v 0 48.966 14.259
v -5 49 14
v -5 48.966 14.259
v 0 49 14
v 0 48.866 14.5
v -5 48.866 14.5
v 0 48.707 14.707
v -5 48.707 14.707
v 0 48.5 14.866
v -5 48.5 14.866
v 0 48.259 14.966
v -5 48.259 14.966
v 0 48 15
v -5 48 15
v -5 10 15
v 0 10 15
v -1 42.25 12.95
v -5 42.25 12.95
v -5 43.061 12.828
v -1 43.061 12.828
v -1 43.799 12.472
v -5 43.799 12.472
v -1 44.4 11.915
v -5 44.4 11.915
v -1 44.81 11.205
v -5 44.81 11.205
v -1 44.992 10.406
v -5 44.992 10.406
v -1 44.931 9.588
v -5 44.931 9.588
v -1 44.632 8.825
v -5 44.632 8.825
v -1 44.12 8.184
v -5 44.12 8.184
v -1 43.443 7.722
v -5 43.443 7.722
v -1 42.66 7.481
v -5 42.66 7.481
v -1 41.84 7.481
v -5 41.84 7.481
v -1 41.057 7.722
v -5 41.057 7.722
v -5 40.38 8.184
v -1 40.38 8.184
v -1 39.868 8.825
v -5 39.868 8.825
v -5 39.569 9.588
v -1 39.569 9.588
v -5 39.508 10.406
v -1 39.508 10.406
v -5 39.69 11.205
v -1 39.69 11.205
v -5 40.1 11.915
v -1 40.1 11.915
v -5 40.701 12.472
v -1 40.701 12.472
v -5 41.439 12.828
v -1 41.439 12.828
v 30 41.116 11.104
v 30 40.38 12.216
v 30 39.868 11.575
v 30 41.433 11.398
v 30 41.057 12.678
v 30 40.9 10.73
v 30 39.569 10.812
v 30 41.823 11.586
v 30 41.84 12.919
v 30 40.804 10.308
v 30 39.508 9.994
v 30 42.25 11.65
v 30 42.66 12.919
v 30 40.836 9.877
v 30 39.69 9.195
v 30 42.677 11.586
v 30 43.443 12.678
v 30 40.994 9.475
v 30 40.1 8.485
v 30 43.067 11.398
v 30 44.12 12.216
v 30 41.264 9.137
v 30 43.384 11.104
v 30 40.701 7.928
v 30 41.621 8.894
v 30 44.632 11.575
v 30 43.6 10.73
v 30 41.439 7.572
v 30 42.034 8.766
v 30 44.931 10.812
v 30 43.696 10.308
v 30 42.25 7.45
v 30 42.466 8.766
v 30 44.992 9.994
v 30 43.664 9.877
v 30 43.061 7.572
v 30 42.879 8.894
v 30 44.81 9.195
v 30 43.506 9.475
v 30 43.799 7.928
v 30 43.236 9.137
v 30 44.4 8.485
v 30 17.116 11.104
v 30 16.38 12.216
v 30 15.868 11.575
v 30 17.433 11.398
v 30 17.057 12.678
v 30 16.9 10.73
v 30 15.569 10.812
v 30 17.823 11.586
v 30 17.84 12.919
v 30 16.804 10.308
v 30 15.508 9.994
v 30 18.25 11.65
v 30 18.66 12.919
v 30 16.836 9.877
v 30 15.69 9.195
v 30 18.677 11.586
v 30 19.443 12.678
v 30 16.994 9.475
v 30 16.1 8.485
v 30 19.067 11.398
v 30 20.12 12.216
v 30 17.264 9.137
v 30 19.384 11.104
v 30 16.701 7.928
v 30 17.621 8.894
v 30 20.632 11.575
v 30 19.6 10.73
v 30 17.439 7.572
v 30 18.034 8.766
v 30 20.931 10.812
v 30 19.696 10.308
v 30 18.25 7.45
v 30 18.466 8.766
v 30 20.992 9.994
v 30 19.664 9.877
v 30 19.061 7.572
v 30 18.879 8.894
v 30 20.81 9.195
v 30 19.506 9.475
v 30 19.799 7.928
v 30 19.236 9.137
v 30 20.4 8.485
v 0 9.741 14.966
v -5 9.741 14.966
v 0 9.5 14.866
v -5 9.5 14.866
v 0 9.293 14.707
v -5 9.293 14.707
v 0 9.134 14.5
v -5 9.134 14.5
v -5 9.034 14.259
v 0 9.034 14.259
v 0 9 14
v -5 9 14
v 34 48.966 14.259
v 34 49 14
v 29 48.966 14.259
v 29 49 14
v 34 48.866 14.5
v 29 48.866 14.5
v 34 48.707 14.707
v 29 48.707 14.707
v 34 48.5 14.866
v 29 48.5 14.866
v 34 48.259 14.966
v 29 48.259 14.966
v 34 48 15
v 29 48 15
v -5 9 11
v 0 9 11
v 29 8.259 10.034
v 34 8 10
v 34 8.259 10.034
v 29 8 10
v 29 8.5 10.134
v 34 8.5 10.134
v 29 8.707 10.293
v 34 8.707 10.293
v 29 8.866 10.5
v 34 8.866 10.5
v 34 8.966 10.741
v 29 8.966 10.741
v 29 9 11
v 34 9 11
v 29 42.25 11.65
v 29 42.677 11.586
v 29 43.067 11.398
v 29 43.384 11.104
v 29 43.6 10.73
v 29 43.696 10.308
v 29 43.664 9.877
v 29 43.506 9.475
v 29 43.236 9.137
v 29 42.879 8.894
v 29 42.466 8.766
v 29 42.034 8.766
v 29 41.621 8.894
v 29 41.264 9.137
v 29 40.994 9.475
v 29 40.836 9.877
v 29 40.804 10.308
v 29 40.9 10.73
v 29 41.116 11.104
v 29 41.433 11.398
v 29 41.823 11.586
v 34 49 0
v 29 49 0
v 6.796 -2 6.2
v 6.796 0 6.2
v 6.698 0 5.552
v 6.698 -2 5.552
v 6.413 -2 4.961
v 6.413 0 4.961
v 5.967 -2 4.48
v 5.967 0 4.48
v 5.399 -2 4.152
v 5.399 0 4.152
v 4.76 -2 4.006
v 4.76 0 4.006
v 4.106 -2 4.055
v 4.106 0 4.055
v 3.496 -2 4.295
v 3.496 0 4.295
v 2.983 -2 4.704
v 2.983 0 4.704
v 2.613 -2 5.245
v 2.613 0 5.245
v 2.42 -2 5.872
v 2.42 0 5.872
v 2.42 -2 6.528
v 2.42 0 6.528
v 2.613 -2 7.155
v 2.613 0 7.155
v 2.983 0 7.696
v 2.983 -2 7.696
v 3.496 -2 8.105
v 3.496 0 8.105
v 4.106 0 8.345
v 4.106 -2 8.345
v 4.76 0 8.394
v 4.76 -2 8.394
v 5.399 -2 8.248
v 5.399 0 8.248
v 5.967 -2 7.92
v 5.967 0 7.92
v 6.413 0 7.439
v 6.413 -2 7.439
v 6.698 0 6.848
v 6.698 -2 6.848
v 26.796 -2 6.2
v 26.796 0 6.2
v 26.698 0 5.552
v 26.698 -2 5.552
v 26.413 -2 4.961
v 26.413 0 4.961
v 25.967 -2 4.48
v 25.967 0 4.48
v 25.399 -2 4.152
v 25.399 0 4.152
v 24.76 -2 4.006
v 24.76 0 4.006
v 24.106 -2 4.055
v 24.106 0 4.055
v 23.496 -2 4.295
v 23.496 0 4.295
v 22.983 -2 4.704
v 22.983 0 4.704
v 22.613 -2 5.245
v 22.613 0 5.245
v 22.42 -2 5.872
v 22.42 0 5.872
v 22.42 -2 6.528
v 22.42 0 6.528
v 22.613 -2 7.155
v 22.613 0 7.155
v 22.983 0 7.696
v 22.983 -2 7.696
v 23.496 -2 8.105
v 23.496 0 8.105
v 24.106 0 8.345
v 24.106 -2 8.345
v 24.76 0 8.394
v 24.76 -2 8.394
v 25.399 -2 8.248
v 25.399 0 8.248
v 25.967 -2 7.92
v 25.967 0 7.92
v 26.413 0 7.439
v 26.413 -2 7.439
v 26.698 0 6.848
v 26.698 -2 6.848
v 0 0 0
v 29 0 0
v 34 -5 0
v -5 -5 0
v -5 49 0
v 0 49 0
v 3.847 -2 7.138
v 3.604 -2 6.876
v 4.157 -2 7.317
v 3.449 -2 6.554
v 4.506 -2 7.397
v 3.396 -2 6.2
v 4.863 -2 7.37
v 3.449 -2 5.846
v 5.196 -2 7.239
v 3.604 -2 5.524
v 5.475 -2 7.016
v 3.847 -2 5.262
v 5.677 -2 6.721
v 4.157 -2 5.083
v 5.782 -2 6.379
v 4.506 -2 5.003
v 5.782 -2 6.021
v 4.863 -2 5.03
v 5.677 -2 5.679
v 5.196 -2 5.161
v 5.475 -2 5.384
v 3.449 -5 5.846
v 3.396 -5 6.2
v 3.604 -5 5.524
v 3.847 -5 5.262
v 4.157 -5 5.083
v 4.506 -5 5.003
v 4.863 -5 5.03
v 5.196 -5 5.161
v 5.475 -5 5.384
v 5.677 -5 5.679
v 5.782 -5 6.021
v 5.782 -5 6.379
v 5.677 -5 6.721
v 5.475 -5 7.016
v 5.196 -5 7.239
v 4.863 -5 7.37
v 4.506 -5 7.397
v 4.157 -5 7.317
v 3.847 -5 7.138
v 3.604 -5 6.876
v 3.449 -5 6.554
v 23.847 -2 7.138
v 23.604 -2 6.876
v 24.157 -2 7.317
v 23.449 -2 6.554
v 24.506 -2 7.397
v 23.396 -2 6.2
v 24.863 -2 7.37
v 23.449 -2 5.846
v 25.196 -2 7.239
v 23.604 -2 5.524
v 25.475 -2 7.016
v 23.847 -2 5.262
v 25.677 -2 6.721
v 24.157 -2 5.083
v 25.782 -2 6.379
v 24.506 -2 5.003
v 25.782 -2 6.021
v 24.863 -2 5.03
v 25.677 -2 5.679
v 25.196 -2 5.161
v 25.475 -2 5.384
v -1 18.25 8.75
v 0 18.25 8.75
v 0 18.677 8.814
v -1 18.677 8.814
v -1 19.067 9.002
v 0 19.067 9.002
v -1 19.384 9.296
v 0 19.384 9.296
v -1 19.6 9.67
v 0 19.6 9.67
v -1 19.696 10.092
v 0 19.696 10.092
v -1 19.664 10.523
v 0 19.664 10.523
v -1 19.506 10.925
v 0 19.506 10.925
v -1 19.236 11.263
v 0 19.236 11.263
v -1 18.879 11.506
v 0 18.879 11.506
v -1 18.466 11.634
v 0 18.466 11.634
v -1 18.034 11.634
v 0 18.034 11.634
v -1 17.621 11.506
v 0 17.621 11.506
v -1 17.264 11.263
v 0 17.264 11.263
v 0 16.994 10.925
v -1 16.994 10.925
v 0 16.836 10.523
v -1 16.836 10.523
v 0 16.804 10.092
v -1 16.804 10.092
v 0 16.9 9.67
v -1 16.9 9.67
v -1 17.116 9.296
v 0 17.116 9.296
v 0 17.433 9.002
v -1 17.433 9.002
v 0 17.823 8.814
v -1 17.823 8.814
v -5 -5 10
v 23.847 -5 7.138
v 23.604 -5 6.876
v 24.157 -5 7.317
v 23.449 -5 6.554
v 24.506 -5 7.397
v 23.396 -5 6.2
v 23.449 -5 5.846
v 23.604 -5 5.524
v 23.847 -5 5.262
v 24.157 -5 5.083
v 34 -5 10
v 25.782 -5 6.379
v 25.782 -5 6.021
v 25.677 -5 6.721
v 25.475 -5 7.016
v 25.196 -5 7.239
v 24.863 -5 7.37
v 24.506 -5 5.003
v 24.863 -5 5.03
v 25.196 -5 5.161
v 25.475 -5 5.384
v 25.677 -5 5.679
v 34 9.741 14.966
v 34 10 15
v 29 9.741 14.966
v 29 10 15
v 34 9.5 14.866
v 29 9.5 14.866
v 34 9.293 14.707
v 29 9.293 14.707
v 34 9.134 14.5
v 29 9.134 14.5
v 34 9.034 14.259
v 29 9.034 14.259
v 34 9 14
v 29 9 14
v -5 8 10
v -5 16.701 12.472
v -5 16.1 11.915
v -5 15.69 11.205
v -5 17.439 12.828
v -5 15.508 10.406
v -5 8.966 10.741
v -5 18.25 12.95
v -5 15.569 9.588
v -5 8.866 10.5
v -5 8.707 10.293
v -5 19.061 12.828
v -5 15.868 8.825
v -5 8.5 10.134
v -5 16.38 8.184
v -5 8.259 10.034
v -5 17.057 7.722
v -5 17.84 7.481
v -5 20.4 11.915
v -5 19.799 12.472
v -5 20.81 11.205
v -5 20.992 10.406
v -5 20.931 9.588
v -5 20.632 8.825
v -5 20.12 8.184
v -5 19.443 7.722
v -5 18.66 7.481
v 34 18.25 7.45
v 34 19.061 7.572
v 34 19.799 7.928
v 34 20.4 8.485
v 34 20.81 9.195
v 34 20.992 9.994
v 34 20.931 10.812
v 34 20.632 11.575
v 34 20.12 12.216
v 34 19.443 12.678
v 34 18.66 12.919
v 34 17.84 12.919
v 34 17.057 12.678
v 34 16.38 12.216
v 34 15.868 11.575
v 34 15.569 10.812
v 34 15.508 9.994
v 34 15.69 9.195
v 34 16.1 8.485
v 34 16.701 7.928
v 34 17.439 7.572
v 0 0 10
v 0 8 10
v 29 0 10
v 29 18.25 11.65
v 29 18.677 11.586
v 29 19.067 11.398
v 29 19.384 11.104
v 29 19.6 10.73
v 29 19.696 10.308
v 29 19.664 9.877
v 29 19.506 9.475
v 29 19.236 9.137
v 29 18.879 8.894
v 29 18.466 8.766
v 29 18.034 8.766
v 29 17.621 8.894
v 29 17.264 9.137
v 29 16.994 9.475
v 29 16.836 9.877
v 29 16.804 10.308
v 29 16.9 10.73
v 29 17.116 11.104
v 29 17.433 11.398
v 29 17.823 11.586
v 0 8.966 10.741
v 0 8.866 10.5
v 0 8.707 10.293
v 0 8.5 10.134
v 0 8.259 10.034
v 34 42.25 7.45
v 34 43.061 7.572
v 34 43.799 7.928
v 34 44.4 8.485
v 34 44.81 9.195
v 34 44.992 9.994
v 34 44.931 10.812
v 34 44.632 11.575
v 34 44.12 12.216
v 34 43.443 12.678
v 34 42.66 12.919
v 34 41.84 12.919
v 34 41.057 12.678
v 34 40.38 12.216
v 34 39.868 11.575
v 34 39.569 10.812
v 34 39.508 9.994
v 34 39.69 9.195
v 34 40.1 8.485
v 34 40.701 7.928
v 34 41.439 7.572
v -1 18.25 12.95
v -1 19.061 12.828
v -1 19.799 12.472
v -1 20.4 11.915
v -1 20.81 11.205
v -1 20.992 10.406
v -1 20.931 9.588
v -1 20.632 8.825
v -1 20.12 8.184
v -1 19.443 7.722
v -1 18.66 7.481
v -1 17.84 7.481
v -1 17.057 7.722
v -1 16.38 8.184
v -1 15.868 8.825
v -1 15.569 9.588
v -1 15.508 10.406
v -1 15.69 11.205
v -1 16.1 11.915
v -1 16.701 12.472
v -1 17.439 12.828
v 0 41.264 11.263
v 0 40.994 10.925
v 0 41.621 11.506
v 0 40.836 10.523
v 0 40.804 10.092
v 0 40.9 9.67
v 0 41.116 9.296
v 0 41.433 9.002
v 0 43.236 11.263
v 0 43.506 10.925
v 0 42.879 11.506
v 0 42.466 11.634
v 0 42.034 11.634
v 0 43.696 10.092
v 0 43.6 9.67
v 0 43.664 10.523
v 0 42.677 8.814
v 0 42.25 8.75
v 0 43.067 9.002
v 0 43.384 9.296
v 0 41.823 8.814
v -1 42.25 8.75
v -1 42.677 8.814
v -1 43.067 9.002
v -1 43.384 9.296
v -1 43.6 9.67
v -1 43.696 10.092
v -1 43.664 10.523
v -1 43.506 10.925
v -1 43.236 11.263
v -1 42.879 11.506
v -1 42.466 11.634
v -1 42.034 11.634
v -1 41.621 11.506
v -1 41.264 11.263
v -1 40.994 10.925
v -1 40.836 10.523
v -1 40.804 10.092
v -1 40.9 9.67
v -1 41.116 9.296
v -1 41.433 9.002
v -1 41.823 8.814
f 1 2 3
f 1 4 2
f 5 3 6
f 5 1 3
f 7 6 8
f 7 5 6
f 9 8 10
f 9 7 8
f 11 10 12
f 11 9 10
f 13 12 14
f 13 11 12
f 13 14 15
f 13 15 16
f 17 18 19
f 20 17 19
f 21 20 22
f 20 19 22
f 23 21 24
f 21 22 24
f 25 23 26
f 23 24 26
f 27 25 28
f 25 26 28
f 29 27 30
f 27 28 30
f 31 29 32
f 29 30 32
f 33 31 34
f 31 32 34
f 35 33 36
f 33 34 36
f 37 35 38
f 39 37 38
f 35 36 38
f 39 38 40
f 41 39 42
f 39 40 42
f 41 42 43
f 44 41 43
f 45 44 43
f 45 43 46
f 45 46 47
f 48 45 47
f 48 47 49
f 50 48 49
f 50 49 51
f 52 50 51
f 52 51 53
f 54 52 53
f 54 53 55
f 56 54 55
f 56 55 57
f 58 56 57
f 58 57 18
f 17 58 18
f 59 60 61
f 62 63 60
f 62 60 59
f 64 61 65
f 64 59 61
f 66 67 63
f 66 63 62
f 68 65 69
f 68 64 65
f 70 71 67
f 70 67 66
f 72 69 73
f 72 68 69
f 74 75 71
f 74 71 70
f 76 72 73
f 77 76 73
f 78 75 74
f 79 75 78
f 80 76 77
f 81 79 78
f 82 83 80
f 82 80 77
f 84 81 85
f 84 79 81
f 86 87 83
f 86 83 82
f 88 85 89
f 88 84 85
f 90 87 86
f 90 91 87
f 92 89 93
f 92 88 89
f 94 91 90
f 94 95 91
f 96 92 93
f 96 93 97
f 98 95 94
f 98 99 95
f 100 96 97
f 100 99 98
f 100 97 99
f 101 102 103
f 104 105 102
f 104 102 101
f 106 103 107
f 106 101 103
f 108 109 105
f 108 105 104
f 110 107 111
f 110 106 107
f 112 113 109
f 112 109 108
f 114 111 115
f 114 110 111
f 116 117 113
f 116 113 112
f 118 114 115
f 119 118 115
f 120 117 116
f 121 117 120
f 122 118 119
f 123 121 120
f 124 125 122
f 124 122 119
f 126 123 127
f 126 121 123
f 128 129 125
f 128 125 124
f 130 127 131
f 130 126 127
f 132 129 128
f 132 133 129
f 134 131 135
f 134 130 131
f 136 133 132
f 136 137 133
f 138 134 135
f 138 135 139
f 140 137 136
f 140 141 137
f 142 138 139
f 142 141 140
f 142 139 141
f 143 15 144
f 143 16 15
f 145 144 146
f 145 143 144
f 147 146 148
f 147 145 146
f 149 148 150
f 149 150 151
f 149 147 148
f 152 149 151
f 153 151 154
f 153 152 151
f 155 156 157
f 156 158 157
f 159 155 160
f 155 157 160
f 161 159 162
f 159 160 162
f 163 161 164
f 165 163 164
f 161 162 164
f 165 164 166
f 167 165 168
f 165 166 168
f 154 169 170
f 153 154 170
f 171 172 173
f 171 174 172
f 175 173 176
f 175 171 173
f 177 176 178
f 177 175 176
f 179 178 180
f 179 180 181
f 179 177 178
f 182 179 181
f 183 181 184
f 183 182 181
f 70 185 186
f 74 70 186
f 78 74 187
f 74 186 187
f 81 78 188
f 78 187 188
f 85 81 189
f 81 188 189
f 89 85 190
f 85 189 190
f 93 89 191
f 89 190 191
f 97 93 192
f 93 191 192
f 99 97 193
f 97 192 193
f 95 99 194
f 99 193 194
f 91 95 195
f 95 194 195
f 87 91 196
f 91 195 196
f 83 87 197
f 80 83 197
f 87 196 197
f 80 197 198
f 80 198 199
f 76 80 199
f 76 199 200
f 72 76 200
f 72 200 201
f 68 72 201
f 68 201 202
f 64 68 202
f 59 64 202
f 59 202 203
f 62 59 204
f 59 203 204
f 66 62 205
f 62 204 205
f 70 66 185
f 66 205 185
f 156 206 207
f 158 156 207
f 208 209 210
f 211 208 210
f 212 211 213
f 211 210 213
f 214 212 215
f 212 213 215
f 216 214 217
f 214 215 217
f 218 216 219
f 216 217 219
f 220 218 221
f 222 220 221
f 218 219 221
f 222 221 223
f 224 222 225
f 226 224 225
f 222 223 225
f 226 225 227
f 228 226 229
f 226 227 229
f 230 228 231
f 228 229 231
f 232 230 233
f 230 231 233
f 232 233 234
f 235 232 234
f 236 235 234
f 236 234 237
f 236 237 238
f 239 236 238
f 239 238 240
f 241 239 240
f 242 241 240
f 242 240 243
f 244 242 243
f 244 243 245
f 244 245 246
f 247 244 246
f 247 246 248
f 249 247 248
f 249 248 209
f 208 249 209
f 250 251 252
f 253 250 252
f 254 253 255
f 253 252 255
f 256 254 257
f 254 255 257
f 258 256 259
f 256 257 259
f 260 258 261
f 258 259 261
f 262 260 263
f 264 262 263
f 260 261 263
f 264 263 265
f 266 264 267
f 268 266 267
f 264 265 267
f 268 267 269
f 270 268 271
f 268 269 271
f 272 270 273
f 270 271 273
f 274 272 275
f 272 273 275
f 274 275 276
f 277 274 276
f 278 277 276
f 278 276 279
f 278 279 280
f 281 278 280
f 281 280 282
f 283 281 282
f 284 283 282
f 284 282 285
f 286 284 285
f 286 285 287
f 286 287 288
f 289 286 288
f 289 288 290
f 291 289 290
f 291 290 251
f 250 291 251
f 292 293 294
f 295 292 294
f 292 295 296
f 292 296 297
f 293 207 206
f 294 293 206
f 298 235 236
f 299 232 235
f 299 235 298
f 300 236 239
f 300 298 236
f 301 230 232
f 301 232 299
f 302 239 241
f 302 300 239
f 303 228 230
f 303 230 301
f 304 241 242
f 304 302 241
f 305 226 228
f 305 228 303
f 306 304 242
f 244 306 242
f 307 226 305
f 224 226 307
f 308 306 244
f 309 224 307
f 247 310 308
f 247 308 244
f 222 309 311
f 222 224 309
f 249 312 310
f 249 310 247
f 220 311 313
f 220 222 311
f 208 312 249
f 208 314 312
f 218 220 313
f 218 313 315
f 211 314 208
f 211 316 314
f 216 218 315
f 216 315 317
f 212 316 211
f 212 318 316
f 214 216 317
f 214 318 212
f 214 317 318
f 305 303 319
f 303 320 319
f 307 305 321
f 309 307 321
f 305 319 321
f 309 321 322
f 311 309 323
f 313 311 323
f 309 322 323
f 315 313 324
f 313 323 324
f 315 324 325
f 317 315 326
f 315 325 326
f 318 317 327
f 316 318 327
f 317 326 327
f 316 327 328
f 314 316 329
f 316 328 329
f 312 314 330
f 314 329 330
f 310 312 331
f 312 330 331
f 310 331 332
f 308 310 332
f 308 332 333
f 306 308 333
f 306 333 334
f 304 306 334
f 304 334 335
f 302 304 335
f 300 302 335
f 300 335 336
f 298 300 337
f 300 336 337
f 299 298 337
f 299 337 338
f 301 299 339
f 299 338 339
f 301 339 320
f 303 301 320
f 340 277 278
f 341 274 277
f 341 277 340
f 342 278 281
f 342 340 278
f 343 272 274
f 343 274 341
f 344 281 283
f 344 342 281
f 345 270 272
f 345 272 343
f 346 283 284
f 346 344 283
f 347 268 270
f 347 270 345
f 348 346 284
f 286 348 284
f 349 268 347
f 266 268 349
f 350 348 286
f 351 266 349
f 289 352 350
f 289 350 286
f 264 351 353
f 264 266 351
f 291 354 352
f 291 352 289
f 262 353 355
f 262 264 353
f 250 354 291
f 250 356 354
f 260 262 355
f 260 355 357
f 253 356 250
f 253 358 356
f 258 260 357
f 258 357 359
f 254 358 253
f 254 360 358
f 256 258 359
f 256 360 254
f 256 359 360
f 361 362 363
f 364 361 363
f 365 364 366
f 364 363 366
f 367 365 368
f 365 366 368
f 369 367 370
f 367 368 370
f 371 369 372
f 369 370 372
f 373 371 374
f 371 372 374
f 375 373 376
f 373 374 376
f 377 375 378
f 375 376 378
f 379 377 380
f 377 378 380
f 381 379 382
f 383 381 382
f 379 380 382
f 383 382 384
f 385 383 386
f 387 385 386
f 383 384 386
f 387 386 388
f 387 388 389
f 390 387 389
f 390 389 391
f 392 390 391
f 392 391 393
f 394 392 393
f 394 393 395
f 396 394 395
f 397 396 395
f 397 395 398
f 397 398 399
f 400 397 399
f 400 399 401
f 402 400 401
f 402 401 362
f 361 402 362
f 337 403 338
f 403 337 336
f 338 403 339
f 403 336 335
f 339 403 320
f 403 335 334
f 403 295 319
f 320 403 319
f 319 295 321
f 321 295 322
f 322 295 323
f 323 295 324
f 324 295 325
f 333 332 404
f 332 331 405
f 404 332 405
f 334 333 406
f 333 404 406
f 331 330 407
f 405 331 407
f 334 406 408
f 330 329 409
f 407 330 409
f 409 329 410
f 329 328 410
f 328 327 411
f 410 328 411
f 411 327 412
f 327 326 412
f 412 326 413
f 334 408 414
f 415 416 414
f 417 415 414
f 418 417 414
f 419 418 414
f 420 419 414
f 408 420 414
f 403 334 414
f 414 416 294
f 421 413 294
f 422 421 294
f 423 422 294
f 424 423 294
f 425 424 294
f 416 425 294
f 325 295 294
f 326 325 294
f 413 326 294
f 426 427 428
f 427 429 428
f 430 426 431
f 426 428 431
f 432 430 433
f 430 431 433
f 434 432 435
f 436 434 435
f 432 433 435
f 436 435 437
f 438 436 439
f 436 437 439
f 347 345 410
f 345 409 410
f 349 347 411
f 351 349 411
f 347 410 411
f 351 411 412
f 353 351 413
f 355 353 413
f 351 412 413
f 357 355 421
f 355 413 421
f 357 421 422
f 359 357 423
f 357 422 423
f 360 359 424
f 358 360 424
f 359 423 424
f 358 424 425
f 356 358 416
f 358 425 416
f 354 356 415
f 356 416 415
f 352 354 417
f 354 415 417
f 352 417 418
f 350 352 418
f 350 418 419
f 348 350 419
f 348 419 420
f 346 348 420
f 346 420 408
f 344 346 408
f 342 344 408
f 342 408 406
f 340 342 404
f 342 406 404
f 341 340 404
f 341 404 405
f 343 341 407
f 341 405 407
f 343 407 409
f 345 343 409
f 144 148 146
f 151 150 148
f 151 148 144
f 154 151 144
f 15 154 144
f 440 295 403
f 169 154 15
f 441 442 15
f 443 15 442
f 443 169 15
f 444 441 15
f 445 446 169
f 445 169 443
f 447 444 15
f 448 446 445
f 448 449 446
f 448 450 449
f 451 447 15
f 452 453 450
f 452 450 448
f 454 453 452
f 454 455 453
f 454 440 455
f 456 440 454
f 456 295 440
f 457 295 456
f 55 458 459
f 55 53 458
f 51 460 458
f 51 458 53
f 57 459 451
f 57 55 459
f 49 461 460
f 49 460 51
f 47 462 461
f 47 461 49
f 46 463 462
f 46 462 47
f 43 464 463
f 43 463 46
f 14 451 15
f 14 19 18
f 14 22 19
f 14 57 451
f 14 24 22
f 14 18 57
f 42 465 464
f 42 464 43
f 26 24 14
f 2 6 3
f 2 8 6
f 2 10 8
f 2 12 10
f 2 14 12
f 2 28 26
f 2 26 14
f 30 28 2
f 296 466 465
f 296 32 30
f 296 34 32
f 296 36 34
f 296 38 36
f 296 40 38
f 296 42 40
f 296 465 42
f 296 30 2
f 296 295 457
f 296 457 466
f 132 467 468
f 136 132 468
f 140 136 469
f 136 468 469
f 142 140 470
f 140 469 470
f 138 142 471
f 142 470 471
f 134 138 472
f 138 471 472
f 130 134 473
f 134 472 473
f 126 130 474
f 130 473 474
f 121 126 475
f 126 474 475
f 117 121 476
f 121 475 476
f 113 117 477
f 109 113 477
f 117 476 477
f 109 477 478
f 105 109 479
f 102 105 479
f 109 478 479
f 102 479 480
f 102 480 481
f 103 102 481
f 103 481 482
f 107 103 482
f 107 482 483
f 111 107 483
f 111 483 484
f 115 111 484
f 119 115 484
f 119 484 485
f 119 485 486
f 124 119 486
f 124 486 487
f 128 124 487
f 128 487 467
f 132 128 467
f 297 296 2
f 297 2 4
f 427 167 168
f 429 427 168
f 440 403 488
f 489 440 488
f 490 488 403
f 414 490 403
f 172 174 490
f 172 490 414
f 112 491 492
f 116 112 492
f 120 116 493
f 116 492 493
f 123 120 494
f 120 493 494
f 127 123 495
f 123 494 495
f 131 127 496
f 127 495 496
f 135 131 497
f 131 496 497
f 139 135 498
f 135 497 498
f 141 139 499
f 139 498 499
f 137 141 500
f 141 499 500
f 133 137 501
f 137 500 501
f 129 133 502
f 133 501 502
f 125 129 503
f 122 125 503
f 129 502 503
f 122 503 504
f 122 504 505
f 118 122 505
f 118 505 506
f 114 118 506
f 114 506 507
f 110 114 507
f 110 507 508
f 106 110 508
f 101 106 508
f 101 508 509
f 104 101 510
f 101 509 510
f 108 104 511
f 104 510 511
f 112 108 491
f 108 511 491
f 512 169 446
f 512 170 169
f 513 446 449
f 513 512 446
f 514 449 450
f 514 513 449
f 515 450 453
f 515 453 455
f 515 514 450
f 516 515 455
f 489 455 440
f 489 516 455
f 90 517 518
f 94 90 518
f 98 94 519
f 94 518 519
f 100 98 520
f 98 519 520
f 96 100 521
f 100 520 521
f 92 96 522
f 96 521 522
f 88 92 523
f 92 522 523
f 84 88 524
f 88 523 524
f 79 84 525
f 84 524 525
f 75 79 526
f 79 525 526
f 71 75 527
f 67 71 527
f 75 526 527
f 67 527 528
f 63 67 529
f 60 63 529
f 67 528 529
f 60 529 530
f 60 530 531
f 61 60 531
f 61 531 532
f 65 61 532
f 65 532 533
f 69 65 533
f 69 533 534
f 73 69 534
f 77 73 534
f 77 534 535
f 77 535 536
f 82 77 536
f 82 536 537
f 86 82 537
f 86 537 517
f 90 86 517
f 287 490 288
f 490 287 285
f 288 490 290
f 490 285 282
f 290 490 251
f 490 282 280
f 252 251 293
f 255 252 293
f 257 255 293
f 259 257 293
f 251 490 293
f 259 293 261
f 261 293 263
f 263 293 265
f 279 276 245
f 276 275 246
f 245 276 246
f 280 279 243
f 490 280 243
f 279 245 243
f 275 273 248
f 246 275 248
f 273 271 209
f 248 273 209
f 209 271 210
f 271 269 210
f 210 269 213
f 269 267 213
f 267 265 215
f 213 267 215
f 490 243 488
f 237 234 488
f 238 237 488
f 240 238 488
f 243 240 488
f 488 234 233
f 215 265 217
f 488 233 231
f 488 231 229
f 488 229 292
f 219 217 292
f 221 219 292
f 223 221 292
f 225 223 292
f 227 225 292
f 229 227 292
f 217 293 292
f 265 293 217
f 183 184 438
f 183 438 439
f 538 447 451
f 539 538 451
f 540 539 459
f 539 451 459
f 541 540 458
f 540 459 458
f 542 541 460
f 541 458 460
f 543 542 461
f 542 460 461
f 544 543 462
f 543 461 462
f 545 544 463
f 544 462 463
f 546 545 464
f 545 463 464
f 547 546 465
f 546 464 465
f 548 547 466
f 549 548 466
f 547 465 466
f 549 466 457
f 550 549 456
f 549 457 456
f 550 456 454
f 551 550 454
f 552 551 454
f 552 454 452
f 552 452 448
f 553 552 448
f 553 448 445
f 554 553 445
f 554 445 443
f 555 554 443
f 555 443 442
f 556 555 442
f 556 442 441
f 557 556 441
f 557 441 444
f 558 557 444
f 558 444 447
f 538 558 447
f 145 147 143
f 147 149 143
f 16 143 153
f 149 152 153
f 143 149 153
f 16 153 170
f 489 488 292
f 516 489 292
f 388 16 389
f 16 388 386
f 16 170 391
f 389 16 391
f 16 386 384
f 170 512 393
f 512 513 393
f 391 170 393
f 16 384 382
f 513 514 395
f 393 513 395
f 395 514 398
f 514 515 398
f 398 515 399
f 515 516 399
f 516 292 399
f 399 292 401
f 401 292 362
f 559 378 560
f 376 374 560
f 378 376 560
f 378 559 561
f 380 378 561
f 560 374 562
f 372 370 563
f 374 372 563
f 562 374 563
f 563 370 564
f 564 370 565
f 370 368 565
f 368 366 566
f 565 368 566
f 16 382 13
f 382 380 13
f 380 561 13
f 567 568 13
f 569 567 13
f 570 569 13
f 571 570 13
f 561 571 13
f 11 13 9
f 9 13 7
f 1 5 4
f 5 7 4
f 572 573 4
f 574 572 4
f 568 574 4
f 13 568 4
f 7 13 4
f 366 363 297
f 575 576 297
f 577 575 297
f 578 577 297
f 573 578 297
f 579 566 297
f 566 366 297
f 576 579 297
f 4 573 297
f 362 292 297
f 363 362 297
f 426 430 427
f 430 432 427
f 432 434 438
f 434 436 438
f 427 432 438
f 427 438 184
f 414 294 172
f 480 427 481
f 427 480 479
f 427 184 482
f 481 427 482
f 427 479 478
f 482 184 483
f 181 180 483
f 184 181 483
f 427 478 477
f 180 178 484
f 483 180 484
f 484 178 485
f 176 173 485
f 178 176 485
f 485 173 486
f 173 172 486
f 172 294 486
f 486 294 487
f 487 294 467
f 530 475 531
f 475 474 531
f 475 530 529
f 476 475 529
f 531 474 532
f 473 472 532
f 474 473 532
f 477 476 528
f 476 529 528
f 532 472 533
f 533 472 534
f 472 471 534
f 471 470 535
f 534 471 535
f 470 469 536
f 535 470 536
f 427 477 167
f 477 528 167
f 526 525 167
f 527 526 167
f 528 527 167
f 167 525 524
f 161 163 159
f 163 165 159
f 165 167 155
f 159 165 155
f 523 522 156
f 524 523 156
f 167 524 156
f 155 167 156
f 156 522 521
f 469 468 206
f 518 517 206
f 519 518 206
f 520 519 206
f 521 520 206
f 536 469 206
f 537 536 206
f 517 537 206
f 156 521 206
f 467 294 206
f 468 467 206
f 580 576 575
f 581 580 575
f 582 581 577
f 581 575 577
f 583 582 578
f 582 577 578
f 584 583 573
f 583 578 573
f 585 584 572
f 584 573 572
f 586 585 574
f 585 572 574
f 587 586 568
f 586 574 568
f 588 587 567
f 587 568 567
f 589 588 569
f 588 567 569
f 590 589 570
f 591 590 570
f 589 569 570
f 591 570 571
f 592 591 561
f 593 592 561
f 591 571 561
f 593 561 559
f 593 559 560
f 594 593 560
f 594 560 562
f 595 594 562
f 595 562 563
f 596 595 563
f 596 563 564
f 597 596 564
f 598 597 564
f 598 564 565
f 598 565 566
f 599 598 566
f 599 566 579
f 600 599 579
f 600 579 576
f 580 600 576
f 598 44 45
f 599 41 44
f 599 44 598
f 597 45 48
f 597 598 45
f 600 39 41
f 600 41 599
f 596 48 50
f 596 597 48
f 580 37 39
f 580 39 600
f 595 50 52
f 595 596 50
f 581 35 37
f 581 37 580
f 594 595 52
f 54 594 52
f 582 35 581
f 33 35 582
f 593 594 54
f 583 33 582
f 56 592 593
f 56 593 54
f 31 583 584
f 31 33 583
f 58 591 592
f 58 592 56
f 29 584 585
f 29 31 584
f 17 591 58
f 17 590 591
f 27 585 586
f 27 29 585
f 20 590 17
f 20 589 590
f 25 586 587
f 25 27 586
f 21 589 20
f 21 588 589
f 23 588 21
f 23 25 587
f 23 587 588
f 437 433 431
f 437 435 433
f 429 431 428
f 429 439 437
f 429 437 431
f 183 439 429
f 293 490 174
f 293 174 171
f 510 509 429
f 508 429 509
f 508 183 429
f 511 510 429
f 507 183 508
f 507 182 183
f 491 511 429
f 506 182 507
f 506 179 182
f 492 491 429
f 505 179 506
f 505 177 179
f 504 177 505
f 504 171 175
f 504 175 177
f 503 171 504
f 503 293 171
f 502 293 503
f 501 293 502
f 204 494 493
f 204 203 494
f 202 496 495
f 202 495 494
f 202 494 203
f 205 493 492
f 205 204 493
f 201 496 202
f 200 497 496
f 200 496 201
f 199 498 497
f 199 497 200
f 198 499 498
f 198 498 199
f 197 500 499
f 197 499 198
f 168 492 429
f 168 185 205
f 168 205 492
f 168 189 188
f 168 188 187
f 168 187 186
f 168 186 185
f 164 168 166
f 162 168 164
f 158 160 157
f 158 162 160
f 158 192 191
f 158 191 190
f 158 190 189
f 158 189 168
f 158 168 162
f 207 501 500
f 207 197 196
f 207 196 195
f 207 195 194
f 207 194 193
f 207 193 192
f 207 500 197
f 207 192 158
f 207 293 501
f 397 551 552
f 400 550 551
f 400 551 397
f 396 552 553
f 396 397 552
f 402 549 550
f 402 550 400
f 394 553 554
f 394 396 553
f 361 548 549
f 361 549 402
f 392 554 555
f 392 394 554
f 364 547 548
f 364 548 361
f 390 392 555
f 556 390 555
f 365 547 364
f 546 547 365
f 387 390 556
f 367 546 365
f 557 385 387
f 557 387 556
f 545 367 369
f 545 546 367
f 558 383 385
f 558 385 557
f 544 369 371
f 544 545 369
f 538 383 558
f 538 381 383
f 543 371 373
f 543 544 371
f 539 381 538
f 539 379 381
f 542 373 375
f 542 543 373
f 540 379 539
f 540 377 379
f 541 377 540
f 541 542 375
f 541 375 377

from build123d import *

# Parameters (mm, degrees)
BOSS_EXTRUDE1_DEPTH              = 10
SKETCH2_W                        = 5
SKETCH2_H                        = 40
BOSS_EXTRUDE2_DEPTH              = 5
CBORE_FOR_M2_SHCS1_D             = 2.4
CBORE_FOR_M2_SHCS1_CBORE_D       = 4.4
CBORE_FOR_M2_SHCS1_CBORE_DEPTH   = 2
CBORE_FOR_M2_5_SHCS1_D           = 2.9
CBORE_FOR_M2_5_SHCS1_DEPTH       = 5
CBORE_FOR_M2_5_SHCS1_CBORE_D     = 5.5
CBORE_FOR_M2_5_SHCS1_CBORE_DEPTH = 4
CBORE_FOR_M2_5_SHCS2_D           = 2.9
CBORE_FOR_M2_5_SHCS2_CBORE_D     = 5.5
CBORE_FOR_M2_5_SHCS2_CBORE_DEPTH = 4
FILLET1_R                        = 1


with BuildPart() as part:
    # Sketch1 → Boss-Extrude1 (new body)
    with BuildSketch(Plane.XY):
        Polygon((0, 0), (0, 49), (-5, 49), (-5, -5), (34, -5), (34, 49), (29, 49), (29, 0), align=None)
    extrude(amount=BOSS_EXTRUDE1_DEPTH)

    # Sketch2 → Boss-Extrude2 (add)
    with BuildSketch(Plane.XY.offset(10)):
        with Locations((-2.5, 29)):
            Rectangle(SKETCH2_W, SKETCH2_H)
    boss_extrude2 = extrude(amount=BOSS_EXTRUDE2_DEPTH)

    # Mirror1: Boss-Extrude2 across plane
    add(boss_extrude2.mirror(Plane.ZY.offset(-14.5)))

    # CBORE for M2 SHCS1 (through all)
    with Locations(Plane(origin=(0, 0, 0), x_dir=(1, 0, 0), z_dir=(0, 1, 0))):
        with Locations((24.59562556, -6.2), (4.59562556, -6.2)):
            CounterBoreHole(CBORE_FOR_M2_SHCS1_D / 2, CBORE_FOR_M2_SHCS1_CBORE_D / 2, CBORE_FOR_M2_SHCS1_CBORE_DEPTH)

    # CBORE for M2.5 SHCS1
    with Locations(Plane(origin=(34, 0, 0), x_dir=(0, 0, -1), z_dir=(1, 0, 0))):
        with Locations((-10.2, 42.25), (-10.2, 18.25)):
            CounterBoreHole(CBORE_FOR_M2_5_SHCS1_D / 2, CBORE_FOR_M2_5_SHCS1_CBORE_D / 2, CBORE_FOR_M2_5_SHCS1_CBORE_DEPTH, depth=CBORE_FOR_M2_5_SHCS1_DEPTH)

    # CBORE for M2.5 SHCS2 (through all)
    with Locations(Plane.ZY.offset(5)):
        with Locations((10.2, 42.25), (10.2, 18.25)):
            CounterBoreHole(CBORE_FOR_M2_5_SHCS2_D / 2, CBORE_FOR_M2_5_SHCS2_CBORE_D / 2, CBORE_FOR_M2_5_SHCS2_CBORE_DEPTH)

    # Fillet1
    fillet1_edges = [part.edges().sort_by_distance(p)[0] for p in [
        (-2.5, 9, 10),
        (-2.5, 9, 15),
        (-2.5, 49, 15),
        (31.5, 49, 15),
        (31.5, 9, 15),
        (31.5, 9, 10),
    ]]
    fillet(fillet1_edges, radius=FILLET1_R)


solid = part.part
